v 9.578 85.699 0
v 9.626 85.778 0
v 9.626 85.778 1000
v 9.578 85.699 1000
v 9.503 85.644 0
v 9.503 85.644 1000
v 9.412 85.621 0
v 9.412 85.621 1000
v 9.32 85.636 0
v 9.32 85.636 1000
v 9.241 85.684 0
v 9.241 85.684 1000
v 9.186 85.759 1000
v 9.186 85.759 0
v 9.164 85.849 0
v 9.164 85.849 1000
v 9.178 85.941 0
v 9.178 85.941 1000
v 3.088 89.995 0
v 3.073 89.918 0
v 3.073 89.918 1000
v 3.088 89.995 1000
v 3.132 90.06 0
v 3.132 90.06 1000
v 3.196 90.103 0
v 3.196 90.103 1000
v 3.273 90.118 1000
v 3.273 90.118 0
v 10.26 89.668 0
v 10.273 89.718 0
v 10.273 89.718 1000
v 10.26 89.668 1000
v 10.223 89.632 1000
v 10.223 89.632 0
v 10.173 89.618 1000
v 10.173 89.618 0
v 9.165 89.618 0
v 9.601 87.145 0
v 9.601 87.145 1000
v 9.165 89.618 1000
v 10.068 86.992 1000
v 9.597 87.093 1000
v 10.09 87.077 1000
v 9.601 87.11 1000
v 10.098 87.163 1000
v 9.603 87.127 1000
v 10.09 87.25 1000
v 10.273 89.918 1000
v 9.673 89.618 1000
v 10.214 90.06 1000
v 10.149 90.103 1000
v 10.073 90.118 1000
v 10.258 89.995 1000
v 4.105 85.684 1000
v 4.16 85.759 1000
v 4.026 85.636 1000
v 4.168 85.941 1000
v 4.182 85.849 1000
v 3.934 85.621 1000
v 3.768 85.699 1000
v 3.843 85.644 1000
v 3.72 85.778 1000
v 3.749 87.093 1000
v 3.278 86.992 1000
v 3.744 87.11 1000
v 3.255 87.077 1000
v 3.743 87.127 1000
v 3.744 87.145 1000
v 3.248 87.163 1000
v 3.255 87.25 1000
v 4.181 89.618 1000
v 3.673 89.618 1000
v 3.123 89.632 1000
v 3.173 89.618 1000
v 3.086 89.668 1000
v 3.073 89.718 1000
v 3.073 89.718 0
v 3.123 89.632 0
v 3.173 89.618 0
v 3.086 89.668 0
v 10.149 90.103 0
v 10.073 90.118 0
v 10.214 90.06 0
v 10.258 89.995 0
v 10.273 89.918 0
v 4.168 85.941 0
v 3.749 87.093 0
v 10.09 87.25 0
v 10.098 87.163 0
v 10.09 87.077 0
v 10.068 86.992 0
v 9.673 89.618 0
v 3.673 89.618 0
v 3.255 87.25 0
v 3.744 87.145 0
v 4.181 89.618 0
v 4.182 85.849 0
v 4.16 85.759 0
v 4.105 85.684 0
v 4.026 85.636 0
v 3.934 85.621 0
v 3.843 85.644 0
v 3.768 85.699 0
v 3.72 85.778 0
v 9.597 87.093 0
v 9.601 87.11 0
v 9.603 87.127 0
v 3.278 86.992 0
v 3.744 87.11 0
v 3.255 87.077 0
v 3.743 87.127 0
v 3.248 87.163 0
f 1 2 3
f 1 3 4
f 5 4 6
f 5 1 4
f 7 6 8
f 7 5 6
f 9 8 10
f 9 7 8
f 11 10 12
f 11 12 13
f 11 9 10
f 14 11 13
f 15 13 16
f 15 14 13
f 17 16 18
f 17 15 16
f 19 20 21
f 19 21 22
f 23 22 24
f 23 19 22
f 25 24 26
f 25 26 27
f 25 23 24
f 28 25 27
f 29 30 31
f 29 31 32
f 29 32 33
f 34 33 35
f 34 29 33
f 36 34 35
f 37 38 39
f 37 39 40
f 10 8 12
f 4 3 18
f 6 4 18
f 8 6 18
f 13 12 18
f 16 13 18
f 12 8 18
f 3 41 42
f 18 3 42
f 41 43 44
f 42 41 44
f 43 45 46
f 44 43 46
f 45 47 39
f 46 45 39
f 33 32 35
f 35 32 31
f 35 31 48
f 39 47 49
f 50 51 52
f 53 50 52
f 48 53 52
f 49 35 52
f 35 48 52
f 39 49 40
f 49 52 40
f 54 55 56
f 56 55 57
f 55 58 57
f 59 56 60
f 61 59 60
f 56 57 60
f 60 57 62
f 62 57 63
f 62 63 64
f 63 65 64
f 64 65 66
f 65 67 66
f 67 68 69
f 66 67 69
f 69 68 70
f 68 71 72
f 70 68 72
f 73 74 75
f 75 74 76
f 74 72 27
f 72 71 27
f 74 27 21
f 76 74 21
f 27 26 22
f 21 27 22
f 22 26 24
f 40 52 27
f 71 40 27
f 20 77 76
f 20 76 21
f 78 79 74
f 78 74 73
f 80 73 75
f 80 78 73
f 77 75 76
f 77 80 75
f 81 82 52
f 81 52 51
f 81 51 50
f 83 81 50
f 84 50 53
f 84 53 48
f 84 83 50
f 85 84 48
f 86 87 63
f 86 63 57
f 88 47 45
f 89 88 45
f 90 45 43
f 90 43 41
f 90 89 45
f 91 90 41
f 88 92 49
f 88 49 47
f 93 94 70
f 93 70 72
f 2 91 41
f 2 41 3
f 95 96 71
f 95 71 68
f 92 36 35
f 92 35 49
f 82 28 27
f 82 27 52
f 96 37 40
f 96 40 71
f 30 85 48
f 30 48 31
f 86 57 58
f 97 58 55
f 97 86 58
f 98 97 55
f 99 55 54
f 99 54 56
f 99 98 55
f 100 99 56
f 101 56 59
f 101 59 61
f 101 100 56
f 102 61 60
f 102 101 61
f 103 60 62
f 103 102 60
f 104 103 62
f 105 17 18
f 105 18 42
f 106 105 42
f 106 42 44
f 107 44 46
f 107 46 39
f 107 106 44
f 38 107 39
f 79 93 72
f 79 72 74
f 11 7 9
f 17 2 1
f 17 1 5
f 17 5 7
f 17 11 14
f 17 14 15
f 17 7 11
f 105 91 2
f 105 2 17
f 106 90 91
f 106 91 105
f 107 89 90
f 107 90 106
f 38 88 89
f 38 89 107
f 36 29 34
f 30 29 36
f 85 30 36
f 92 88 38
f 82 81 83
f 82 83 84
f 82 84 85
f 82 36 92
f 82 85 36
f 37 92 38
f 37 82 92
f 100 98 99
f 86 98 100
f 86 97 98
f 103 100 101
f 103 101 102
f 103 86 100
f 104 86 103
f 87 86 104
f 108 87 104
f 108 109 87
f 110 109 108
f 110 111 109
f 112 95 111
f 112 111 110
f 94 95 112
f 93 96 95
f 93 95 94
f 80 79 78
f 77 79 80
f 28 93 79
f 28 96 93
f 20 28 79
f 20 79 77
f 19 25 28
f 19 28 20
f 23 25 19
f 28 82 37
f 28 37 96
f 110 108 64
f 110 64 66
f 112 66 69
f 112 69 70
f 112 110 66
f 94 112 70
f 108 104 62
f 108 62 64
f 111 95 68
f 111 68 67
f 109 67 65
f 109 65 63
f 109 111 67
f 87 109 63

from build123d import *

# Parameters (mm, degrees)
EXTRUDE_1_DEPTH = 1000


with BuildPart() as part:
    # 草图1 → 拉伸1 (new body)
    with BuildSketch(Plane.XY):
        with BuildLine():
            Line((3.719845542, 85.778219074), (3.277947439, 86.992324134))
            ThreePointArc((3.277947439, 86.992324134), (3.2496964, 87.119756335), (3.255389873, 87.250158295))
            Line((3.255389873, 87.250158295), (3.67294288, 89.618219074))
            Line((3.67294288, 89.618219074), (3.17294288, 89.618219074))
            ThreePointArc((3.17294288, 89.618219074), (3.102232202, 89.647508396), (3.07294288, 89.718219074))
            Line((3.07294288, 89.718219074), (3.07294288, 89.918219074))
            ThreePointArc((3.07294288, 89.918219074), (3.131521524, 90.05964043), (3.27294288, 90.118219074))
            Line((3.27294288, 90.118219074), (10.07294288, 90.118219074))
            ThreePointArc((10.07294288, 90.118219074), (10.214364237, 90.05964043), (10.27294288, 89.918219074))
            Line((10.27294288, 89.918219074), (10.27294288, 89.718219074))
            ThreePointArc((10.27294288, 89.718219074), (10.243653558, 89.647508396), (10.17294288, 89.618219074))
            Line((10.17294288, 89.618219074), (9.67294288, 89.618219074))
            Line((9.67294288, 89.618219074), (10.090495888, 87.250158295))
            ThreePointArc((10.090495888, 87.250158295), (10.09618936, 87.119756335), (10.067938321, 86.992324134))
            Line((10.067938321, 86.992324134), (9.626040218, 85.778219074))
            ThreePointArc((9.626040218, 85.778219074), (9.320291197, 85.635645964), (9.177718087, 85.941394985))
            Line((9.177718087, 85.941394985), (9.596882624, 87.093040086))
            ThreePointArc((9.596882624, 87.093040086), (9.602532832, 87.118526526), (9.601394137, 87.144606918))
            Line((9.601394137, 87.144606918), (9.165229574, 89.618219074))
            Line((9.165229574, 89.618219074), (4.180656186, 89.618219074))
            Line((4.180656186, 89.618219074), (3.744491623, 87.144606918))
            ThreePointArc((3.744491623, 87.144606918), (3.743352929, 87.118526526), (3.749003137, 87.093040086))
            Line((3.749003137, 87.093040086), (4.168167674, 85.941394985))
            ThreePointArc((4.168167674, 85.941394985), (4.025594564, 85.635645964), (3.719845542, 85.778219074))
        make_face()
    extrude(amount=EXTRUDE_1_DEPTH)


solid = part.part
